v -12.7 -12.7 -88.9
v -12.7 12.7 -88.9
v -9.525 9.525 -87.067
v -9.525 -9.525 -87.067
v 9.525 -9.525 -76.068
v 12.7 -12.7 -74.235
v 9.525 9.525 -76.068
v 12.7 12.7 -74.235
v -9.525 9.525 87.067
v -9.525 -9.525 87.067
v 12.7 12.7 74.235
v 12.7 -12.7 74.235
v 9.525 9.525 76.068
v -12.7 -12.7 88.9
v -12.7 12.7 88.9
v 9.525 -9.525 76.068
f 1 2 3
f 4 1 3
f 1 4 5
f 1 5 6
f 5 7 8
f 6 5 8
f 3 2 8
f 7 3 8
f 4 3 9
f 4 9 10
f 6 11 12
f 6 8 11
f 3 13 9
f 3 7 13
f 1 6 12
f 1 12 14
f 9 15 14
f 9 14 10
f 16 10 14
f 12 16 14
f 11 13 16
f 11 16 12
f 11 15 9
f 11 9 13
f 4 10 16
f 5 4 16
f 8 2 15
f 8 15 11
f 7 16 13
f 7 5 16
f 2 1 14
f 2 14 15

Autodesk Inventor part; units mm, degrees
ref_plane "YZ Plane" through (0, 0, 0) normal (1, 0, 0) x (0, 1, 0)
ref_plane "XZ Plane" through (0, 0, 0) normal (0, 1, 0) x (-1, 0, 0)
ref_plane "XY Plane" through (0, 0, 0) normal (0, 0, 1) x (1, 0, 0)
sketch "Sketch1" plane through (0, 0, 0) normal (0, 0, 1) x (1, 0, 0)
  line L0 (-17.78, 0) -> (17.78, 0) projected
  line L1 (0, -17.78) -> (0, 17.78) projected
  line L2 (-12.7, 12.7) -> (12.7, 12.7)
  line L3 (12.7, 12.7) -> (12.7, -12.7)
  line L4 (12.7, -12.7) -> (-12.7, -12.7)
  line L5 (-12.7, -12.7) -> (-12.7, 12.7)
  line L6 (9.525, 9.525) -> (-9.525, 9.525)
  line L7 (-9.525, 9.525) -> (-9.525, -9.525)
  line L8 (-9.525, -9.525) -> (9.525, -9.525)
  line L9 (9.525, -9.525) -> (9.525, 9.525)
  point P0 (0, 0)
  point P1 (-12.7, 0)
  point P2 (0, 12.7)
  dimension "d0" = 25.4
  dimension "d1" = 3.175
extrude "Extrusion1" add sketch "Sketch1" along normal mid plane 177.8 contours L5 L2 L1 L6 L7 L0 | L0 L7 L8 L1 L4 L5 | L1 L8 L9 L0 L3 L4 | L2 L3 L0 L9 L6 L1
sketch "Sketch3" plane through (-12.7, 12.7, 88.9) normal (0, 1, 0) x (1, 0, 0)
  line L0 (0, 0) -> (25.4, 0) projected
  line L1 (25.4, 0) -> (25.4, 177.8) projected
  line L2 (0, 177.8) -> (0, 0) projected
  line L3 (0, 88.9) -> (25.4, 88.9) construction
  line L4 (0, 0) -> (25.4, 14.6647)
  line L5 (0, 0) -> (25.4, 0)
  line L6 (25.4, 0) -> (25.4, 14.6647)
  line L7 (0, 177.8) -> (25.4, 163.1353)
  line L8 (0, 177.8) -> (25.4, 177.8)
  line L9 (25.4, 177.8) -> (25.4, 163.1353)
  point P0 (12.7, 88.9)
  dimension "d7" = 30
extrude "Extrusion3" cut sketch "Sketch3" against normal through all contours L4 L1 L0 | L8 L1 L7
properties part number "tubing_template_0.125" material "Aluminum-6061"
